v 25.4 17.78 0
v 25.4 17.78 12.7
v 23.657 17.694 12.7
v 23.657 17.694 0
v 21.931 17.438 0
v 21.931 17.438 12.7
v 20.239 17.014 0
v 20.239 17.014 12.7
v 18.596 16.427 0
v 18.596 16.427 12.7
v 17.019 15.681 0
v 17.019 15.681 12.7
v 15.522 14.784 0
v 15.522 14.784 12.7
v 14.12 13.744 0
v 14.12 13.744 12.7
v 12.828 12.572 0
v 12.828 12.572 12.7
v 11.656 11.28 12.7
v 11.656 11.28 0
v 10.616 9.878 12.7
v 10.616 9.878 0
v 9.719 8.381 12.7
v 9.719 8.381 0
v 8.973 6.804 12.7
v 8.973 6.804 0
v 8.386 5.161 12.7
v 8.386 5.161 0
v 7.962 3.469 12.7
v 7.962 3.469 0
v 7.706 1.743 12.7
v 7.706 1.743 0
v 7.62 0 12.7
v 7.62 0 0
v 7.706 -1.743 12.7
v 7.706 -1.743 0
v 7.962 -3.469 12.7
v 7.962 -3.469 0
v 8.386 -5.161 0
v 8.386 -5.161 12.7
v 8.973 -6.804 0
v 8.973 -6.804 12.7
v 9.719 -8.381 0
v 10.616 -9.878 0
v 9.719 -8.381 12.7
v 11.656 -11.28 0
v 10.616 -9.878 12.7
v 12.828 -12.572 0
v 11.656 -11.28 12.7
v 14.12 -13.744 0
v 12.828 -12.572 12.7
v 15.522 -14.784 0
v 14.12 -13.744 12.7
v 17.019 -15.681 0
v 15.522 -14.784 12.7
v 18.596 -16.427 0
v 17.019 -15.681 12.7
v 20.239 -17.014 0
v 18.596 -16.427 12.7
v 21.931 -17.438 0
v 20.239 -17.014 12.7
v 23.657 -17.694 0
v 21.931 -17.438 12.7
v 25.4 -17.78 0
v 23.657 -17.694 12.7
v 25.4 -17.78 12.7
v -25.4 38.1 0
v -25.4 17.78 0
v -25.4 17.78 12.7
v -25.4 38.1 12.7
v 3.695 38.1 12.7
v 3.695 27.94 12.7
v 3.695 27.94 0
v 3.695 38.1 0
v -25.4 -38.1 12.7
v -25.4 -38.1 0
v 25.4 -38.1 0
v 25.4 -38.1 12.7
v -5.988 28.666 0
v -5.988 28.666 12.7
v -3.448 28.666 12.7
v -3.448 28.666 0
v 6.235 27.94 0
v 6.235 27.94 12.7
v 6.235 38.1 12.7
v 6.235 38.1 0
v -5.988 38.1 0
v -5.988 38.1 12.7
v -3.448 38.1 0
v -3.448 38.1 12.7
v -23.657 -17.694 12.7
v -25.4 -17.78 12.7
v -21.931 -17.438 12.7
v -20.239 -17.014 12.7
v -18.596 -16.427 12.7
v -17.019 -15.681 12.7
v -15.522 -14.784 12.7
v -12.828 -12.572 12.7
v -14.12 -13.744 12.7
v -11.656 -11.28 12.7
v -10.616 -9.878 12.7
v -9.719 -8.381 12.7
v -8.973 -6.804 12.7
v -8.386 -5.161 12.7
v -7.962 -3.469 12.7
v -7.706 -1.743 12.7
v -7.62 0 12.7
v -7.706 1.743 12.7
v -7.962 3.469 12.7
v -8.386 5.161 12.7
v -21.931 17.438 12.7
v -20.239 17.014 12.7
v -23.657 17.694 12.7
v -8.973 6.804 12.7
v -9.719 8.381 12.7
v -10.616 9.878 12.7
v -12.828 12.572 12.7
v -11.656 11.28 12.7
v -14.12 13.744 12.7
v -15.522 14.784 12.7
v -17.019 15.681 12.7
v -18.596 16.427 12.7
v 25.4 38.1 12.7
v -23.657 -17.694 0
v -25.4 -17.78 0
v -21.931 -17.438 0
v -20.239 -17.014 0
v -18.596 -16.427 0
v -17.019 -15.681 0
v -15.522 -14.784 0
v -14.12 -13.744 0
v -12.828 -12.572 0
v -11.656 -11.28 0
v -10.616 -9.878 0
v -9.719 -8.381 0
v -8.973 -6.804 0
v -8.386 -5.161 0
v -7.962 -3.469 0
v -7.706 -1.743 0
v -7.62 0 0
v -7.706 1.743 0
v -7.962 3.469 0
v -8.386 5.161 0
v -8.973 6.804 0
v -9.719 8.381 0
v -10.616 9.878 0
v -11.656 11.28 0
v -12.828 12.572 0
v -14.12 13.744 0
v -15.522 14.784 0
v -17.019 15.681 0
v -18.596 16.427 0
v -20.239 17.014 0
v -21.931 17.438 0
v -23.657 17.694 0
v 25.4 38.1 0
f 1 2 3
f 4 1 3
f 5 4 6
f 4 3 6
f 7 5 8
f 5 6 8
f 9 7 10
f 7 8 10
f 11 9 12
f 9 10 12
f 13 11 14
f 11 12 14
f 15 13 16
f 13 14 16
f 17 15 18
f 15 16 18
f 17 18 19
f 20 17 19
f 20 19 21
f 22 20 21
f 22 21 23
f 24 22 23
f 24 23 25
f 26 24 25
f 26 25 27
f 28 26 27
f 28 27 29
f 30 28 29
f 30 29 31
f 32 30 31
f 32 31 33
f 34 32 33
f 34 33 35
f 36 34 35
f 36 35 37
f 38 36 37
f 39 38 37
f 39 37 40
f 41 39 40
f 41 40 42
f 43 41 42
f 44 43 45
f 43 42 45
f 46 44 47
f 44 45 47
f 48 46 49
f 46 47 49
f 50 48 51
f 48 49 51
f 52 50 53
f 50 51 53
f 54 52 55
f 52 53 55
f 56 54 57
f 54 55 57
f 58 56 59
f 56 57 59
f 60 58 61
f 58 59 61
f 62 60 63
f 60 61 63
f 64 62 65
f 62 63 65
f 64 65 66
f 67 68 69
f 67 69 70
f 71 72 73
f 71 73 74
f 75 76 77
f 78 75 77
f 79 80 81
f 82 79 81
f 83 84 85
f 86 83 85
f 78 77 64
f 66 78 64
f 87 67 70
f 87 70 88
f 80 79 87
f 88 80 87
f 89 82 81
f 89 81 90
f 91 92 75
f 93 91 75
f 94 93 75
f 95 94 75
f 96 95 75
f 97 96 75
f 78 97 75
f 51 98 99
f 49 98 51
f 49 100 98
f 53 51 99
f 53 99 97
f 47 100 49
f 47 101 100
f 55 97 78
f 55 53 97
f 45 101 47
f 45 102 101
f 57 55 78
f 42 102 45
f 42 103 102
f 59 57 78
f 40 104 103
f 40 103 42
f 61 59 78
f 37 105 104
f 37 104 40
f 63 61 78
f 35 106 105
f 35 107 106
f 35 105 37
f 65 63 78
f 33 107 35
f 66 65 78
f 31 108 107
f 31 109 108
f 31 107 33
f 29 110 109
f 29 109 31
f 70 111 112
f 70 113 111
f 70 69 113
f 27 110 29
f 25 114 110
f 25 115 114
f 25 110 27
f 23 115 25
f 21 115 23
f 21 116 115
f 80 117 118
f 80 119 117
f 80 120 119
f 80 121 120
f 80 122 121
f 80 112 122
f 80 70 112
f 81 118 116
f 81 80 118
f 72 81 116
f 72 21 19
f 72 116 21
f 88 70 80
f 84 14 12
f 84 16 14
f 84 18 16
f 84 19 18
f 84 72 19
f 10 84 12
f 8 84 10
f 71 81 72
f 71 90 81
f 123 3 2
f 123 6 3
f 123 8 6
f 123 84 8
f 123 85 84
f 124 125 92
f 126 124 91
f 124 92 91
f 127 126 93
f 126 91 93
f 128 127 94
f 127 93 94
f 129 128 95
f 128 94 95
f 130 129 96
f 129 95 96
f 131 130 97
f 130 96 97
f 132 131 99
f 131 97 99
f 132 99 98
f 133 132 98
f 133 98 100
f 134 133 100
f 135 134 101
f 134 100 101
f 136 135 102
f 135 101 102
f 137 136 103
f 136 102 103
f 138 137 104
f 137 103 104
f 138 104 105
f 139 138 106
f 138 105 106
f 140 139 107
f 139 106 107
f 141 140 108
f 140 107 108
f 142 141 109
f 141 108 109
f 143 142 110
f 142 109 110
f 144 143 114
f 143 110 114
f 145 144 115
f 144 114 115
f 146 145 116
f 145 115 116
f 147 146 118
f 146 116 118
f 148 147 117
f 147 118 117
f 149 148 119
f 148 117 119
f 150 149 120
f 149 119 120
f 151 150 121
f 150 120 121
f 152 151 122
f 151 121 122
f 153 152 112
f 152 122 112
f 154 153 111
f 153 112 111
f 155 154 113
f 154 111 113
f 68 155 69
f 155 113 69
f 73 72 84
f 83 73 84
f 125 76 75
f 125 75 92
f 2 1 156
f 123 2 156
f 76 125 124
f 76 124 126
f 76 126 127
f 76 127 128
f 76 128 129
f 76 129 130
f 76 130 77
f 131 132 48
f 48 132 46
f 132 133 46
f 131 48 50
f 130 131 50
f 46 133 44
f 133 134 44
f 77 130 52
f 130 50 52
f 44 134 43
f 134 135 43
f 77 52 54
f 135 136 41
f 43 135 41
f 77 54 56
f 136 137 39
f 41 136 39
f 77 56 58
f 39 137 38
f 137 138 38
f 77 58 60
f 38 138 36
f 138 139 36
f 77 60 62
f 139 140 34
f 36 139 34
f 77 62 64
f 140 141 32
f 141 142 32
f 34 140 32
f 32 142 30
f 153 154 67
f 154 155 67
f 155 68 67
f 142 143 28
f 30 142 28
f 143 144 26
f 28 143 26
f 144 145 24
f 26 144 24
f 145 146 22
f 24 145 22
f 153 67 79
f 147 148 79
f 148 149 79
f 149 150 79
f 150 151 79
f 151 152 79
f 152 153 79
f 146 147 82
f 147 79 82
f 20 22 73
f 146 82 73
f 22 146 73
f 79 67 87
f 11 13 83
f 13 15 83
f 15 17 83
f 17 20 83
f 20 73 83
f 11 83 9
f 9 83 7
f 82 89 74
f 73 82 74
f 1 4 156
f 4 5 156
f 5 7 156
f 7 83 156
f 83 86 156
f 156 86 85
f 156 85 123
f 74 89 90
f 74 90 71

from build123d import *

# Parameters (mm, degrees)
F0_W     = 50.8
F0_H     = 76.2
F1_DEPTH = 12.7
F2_R     = 17.78
F3_DEPTH = 25.4
F4_R     = 17.78
F5_DEPTH = 25.4
F6_W     = 2.54
F6_H     = 10.16
F7_DEPTH = 25.4
F8_W     = 2.54
F8_H     = 10.16
F9_DEPTH = 25.4


with BuildPart() as f1:
    # F0 (on Top) → F1 (new body)
    with BuildSketch(Plane.XY):
        Rectangle(F0_W, F0_H)
    extrude(amount=F1_DEPTH)

    # F2 (on face) → F3 (cut)
    with BuildSketch(Plane.XY.offset(12.7)):
        with Locations((25.4, 0)):
            Circle(F2_R)
    extrude(amount=-F3_DEPTH, mode=Mode.SUBTRACT)

    # F4 (on face) → F5 (cut)
    with BuildSketch(Plane.XY.offset(12.7)):
        with Locations((-25.4, 0)):
            Circle(F4_R)
    extrude(amount=-F5_DEPTH, mode=Mode.SUBTRACT)

    # F6 (on face) → F7 (cut)
    with BuildSketch(Plane.XY.offset(12.7)):
        with Locations((4.96473, 33.02)):
            Rectangle(F6_W, F6_H)
    extrude(amount=-F7_DEPTH, mode=Mode.SUBTRACT)

    # F8 (on face) → F9 (cut)
    with BuildSketch(Plane.XY.offset(12.7)):
        with Locations((-4.718008, 33.746003)):
            Rectangle(F8_W, F8_H)
    extrude(amount=-F9_DEPTH, mode=Mode.SUBTRACT)


solid = f1.part
